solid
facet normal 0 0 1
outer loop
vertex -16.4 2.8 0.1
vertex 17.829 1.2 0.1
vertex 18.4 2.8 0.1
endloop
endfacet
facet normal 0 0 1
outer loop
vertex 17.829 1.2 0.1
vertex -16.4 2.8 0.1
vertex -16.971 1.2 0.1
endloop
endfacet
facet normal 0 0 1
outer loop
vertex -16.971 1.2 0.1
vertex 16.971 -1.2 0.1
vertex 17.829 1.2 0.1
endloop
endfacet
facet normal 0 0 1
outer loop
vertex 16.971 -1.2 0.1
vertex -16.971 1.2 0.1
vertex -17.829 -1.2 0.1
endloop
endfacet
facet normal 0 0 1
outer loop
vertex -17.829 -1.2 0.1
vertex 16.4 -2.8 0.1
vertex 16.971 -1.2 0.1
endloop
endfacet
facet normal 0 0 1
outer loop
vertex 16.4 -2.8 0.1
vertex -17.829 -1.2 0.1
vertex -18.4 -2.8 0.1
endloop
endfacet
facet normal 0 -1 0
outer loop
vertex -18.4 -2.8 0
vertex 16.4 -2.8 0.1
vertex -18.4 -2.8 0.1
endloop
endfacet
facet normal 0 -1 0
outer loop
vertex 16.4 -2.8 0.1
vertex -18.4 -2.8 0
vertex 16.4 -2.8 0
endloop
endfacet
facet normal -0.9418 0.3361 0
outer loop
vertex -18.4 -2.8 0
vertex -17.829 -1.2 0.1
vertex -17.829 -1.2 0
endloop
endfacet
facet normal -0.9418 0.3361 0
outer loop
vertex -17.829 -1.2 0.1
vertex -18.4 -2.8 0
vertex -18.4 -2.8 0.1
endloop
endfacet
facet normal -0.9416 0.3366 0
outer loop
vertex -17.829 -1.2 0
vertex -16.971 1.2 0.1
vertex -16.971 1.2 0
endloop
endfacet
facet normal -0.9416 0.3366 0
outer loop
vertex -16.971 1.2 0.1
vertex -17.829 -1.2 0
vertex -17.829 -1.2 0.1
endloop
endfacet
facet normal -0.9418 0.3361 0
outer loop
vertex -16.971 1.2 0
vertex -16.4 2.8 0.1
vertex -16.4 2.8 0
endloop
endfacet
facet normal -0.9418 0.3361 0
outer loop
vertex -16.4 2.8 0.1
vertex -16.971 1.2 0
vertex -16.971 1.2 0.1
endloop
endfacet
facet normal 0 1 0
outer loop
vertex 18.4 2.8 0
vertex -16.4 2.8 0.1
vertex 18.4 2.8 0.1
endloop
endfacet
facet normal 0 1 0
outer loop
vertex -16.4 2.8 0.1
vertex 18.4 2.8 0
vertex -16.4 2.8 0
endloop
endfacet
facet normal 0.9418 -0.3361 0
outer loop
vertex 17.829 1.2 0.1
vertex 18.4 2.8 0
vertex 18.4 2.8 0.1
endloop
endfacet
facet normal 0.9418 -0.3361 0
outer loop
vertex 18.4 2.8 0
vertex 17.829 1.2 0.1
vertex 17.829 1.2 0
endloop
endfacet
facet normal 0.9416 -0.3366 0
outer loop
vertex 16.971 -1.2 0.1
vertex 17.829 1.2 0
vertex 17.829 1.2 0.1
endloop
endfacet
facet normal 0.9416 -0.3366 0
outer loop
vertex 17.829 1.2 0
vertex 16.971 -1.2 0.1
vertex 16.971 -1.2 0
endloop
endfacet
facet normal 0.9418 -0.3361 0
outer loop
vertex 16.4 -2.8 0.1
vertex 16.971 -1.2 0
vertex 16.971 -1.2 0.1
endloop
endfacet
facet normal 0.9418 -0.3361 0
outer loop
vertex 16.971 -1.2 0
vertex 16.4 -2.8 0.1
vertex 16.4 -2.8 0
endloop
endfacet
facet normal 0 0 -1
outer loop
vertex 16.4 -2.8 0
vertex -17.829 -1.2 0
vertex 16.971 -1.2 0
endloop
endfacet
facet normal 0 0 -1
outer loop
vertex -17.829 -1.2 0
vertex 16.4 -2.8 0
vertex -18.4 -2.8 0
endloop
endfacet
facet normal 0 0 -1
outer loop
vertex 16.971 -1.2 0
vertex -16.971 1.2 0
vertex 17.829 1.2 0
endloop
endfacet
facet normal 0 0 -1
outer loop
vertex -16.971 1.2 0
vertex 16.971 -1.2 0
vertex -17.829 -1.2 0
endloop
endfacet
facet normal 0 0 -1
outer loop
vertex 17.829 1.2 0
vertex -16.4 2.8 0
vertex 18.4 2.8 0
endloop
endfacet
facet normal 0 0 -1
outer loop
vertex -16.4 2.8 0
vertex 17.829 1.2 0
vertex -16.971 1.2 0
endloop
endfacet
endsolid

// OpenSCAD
use <../lib.scad>
function ldraw_lib__6422772f() = [
// 0 Sticker  0.7 x  4.6 with Right Sand Green and Black Windshield Pillar
// 0 Name: 6422772f.dat
// 0 Author: Florent Faramond [Makou]
// 0 !LDRAW_ORG Part UPDATE 2025-02
// 0 !LICENSE Licensed under CC BY 4.0 : see CAreadme.txt
// 
// 0 BFC CERTIFY CCW
  [0,"BFC","CERTIFY"],
  [0,"BFC","CCW"],
// 
// 0 !KEYWORDS Bricklink 10317stk01, Brickowl 529633, Defender 90, Land Rover
// 0 !KEYWORDS Rebrickable 10102115, Set 10317
// 
// 0 !HISTORY 2025-02-27 [OrionP] Official Update 2025-02
// 
// 
// 4 0 44.5714 -0.25 3 46 -0.25 7 -41 -0.25 7 -42.4286 -0.25 3
  [4,0,44.5714,-0.25,3,46,-0.25,7,-41,-0.25,7,-42.4286,-0.25,3],
// 4 378 -44.5714 -0.25 -3 42.4286 -0.25 -3 44.5714 -0.25 3 -42.4286 -0.25 3
  [4,378,-44.5714,-0.25,-3,42.4286,-0.25,-3,44.5714,-0.25,3,-42.4286,-0.25,3],
// 4 0 -44.5714 -0.25 -3 -46 -0.25 -7 41 -0.25 -7 42.4286 -0.25 -3
  [4,0,-44.5714,-0.25,-3,-46,-0.25,-7,41,-0.25,-7,42.4286,-0.25,-3],
// 4 16 -46 -0.25 -7 -46 0 -7 41 0 -7 41 -0.25 -7
  [4,16,-46,-0.25,-7,-46,0,-7,41,0,-7,41,-0.25,-7],
// 4 16 -46 -0.25 -7 -44.5714 -0.25 -3 -44.5714 0 -3 -46 0 -7
  [4,16,-46,-0.25,-7,-44.5714,-0.25,-3,-44.5714,0,-3,-46,0,-7],
// 4 16 -44.5714 -0.25 -3 -42.4286 -0.25 3 -42.4286 0 3 -44.5714 0 -3
  [4,16,-44.5714,-0.25,-3,-42.4286,-0.25,3,-42.4286,0,3,-44.5714,0,-3],
// 4 16 -42.4286 -0.25 3 -41 -0.25 7 -41 0 7 -42.4286 0 3
  [4,16,-42.4286,-0.25,3,-41,-0.25,7,-41,0,7,-42.4286,0,3],
// 4 16 -41 -0.25 7 46 -0.25 7 46 0 7 -41 0 7
  [4,16,-41,-0.25,7,46,-0.25,7,46,0,7,-41,0,7],
// 4 16 46 -0.25 7 44.5714 -0.25 3 44.5714 0 3 46 0 7
  [4,16,46,-0.25,7,44.5714,-0.25,3,44.5714,0,3,46,0,7],
// 4 16 44.5714 -0.25 3 42.4286 -0.25 -3 42.4286 0 -3 44.5714 0 3
  [4,16,44.5714,-0.25,3,42.4286,-0.25,-3,42.4286,0,-3,44.5714,0,3],
// 4 16 42.4286 -0.25 -3 41 -0.25 -7 41 0 -7 42.4286 0 -3
  [4,16,42.4286,-0.25,-3,41,-0.25,-7,41,0,-7,42.4286,0,-3],
// 4 16 41 0 -7 -46 0 -7 -44.5714 0 -3 42.4286 0 -3
  [4,16,41,0,-7,-46,0,-7,-44.5714,0,-3,42.4286,0,-3],
// 4 16 42.4286 0 -3 -44.5714 0 -3 -42.4286 0 3 44.5714 0 3
  [4,16,42.4286,0,-3,-44.5714,0,-3,-42.4286,0,3,44.5714,0,3],
// 4 16 44.5714 0 3 -42.4286 0 3 -41 0 7 46 0 7
  [4,16,44.5714,0,3,-42.4286,0,3,-41,0,7,46,0,7],
];
module ldraw_lib__6422772f(step=0, col=false, unit=2/5, alt=false, line=0.2, solid=!$preview)
    makepoly(ldraw_lib__6422772f(), step=step, col=col, unit=unit, alt=alt, line=line, solid=solid);
ldraw_lib__6422772f(line=0.2);
